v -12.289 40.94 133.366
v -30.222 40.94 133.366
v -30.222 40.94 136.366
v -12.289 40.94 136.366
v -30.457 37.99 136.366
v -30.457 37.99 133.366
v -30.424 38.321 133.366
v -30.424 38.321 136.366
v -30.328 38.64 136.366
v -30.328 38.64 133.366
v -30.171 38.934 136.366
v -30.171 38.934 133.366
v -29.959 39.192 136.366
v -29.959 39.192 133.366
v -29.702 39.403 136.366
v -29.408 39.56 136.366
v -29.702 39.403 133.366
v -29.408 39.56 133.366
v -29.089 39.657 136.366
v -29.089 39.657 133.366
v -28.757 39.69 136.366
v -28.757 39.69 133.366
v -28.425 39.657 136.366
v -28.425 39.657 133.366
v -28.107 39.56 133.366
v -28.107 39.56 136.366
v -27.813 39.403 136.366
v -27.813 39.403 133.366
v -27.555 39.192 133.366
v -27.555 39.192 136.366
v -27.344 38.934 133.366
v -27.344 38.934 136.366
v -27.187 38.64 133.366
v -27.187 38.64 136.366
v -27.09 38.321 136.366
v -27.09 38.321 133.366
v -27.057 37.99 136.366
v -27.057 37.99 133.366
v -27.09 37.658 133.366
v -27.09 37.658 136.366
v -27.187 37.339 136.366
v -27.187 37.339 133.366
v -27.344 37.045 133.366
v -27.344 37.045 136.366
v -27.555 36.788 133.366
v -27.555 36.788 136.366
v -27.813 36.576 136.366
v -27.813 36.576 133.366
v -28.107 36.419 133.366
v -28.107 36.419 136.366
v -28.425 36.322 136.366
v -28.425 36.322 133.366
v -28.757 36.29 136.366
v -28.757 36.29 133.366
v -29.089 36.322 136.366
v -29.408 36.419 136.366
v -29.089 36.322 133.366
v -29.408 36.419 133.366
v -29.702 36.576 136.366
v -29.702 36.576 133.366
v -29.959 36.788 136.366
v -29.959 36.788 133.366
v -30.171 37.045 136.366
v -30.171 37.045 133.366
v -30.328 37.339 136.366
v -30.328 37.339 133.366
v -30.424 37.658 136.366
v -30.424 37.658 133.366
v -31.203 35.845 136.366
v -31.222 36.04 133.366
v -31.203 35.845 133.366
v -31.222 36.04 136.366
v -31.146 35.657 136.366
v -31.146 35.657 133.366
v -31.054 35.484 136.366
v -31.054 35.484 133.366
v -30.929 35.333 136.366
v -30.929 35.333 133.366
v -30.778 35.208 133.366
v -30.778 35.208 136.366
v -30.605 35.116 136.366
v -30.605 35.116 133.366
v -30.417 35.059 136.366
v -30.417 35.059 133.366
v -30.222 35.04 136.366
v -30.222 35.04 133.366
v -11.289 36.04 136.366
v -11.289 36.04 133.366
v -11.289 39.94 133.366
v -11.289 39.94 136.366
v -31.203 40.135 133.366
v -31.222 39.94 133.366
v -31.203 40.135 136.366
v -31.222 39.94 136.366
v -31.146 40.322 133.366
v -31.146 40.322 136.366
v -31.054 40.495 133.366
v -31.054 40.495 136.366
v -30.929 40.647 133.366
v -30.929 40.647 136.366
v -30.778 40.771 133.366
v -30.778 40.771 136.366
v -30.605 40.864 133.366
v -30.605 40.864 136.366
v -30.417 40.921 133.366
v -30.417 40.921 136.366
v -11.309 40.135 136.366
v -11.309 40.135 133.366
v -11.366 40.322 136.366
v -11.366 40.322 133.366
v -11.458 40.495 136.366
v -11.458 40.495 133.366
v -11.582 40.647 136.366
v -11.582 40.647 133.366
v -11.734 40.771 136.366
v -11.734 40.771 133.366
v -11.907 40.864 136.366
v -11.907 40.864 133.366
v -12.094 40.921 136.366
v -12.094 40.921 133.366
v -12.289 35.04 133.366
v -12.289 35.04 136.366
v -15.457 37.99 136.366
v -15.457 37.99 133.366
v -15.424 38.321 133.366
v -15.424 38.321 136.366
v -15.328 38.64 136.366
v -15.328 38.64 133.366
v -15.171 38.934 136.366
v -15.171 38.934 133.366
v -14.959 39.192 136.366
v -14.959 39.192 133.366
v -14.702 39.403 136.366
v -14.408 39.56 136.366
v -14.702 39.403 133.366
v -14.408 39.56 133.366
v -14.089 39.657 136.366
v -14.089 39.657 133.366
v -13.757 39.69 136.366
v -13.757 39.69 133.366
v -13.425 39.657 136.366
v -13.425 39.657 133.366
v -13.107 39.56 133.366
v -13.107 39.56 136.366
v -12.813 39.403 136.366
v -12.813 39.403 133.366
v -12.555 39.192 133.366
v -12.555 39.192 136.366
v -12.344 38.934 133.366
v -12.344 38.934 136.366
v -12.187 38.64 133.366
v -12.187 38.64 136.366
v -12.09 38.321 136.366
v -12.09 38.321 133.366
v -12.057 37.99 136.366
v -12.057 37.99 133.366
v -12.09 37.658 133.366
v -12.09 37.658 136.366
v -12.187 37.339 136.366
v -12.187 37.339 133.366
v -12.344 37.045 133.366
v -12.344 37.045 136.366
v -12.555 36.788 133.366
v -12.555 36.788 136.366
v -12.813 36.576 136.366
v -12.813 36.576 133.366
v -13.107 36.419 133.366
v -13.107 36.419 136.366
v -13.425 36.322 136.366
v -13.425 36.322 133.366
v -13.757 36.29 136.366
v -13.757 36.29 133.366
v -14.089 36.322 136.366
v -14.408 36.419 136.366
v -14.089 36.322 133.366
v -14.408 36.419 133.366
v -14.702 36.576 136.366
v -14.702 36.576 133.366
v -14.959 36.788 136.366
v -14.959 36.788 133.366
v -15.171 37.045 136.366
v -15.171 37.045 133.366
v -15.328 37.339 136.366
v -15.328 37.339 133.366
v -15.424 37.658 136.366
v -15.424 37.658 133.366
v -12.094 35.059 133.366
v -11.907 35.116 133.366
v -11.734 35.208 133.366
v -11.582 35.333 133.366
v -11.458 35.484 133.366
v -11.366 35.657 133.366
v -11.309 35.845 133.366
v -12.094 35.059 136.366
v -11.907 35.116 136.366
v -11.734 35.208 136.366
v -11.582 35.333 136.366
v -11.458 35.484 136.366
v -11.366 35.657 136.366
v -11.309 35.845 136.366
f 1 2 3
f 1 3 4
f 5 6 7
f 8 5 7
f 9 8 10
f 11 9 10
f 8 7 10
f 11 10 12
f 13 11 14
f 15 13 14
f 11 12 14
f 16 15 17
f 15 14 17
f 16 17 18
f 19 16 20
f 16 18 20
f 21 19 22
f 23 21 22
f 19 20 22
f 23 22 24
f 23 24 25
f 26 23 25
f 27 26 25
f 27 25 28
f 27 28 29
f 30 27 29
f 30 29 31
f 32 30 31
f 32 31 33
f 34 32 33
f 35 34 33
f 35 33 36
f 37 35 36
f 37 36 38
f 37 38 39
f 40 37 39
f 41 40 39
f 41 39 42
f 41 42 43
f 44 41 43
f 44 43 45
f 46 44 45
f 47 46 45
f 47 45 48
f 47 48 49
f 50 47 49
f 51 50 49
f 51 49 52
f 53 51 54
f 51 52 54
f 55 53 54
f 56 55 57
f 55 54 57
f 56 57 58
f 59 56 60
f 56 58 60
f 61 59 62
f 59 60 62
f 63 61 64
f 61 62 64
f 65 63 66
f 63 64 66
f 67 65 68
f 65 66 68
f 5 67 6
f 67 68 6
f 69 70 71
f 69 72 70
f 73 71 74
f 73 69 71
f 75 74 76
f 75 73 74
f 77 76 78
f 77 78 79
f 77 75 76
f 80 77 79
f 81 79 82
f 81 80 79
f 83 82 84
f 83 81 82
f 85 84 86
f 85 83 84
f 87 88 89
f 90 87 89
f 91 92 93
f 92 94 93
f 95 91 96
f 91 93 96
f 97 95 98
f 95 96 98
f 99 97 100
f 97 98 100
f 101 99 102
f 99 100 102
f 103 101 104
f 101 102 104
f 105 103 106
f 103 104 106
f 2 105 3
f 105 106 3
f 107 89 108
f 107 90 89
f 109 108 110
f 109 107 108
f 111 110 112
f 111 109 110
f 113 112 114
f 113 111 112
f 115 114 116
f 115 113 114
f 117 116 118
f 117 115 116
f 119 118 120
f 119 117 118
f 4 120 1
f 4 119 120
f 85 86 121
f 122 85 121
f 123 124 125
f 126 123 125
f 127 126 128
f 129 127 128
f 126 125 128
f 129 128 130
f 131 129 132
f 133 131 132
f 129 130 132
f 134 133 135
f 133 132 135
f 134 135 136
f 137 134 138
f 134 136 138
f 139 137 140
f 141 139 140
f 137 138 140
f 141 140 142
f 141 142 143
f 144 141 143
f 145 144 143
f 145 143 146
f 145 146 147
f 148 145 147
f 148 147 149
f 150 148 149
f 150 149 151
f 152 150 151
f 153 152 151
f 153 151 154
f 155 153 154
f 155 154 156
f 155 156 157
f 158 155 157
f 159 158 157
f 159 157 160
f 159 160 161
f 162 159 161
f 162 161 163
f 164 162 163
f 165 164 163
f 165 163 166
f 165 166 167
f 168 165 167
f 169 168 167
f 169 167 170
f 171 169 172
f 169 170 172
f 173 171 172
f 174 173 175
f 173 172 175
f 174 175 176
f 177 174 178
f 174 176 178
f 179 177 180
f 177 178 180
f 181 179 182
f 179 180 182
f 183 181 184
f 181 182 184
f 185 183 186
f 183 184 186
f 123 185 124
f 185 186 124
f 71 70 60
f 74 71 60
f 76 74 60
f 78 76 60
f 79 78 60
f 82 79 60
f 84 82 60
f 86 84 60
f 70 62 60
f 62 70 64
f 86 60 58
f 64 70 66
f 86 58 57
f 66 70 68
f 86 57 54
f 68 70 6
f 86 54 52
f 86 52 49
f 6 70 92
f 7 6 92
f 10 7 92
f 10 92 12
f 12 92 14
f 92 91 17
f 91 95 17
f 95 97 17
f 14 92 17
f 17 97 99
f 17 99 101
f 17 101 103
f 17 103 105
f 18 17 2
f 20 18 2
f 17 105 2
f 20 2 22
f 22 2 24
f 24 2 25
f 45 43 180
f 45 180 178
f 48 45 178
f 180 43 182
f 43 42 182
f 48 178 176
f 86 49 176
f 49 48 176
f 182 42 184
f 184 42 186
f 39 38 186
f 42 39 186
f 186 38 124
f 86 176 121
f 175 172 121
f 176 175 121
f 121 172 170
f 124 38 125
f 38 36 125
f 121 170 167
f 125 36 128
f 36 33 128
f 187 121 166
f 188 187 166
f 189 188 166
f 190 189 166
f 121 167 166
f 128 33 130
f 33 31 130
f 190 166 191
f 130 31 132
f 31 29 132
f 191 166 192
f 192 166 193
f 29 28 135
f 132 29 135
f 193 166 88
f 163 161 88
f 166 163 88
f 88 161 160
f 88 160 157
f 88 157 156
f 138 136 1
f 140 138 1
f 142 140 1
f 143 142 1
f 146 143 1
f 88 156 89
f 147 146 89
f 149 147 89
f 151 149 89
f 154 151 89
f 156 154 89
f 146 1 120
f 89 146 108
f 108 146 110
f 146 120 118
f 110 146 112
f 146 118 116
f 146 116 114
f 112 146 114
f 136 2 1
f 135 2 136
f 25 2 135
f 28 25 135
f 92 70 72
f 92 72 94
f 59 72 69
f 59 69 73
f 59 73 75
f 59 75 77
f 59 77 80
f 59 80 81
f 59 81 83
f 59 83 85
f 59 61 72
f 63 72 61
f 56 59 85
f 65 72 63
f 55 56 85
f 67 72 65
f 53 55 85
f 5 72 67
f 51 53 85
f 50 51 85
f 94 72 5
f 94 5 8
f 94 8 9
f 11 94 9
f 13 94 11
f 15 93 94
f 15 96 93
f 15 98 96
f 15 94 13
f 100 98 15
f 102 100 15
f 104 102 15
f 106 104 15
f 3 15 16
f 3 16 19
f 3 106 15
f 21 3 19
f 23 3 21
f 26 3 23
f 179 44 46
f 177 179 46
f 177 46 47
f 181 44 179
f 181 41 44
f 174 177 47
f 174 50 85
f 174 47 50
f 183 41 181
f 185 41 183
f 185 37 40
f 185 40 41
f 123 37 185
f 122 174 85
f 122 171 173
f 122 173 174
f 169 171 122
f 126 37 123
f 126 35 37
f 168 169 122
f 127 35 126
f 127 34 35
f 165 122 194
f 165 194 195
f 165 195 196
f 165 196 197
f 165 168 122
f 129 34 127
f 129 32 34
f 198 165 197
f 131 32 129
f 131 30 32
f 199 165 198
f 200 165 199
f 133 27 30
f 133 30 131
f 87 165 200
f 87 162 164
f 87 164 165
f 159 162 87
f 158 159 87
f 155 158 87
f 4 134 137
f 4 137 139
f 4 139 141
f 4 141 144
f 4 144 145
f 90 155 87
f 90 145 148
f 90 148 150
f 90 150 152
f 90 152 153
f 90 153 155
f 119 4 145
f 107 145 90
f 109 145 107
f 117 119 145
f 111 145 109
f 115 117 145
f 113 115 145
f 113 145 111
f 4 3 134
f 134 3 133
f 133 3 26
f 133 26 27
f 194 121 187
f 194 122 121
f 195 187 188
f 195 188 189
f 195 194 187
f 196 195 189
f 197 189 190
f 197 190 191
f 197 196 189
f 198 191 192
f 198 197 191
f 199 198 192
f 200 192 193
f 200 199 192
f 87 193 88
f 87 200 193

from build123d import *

# Parameters (mm, degrees)
SKETCH2_W                = 19.932631385
SKETCH2_H                = 5.9
BOSS_EXTRUDE1_DEPTH      = 3
FILLET1_R                = 1
M3_CLEARANCE_HOLE1_D     = 3.4
M3_CLEARANCE_HOLE1_DEPTH = 16.5
M3_CLEARANCE_HOLE1_TIP   = 1.021463052


with BuildPart() as part:
    # Sketch2 → Boss-Extrude1 (new body)
    with BuildSketch(Plane.XY.offset(133.365661293)):
        with Locations((-21.255805031, 37.989811256)):
            Rectangle(SKETCH2_W, SKETCH2_H)
    extrude(amount=BOSS_EXTRUDE1_DEPTH)

    # Fillet1
    fillet1_edges = [part.edges().sort_by_distance(p)[0] for p in [
        (-31.222120723, 40.939811256, 134.865661293),
        (-11.289489338, 40.939811256, 134.865661293),
        (-11.289489338, 35.039811256, 134.865661293),
        (-31.222120723, 35.039811256, 134.865661293),
    ]]
    fillet(fillet1_edges, radius=FILLET1_R)

    # M3 Clearance Hole1
    with Locations(Plane.XY.offset(136.365661293)):
        with Locations((-28.757120723, 37.989811256), (-13.757120723, 37.989811256)):
            Hole(M3_CLEARANCE_HOLE1_D / 2, depth=M3_CLEARANCE_HOLE1_DEPTH)
            with Locations((0, 0, -(M3_CLEARANCE_HOLE1_DEPTH + M3_CLEARANCE_HOLE1_TIP / 2))):  # 118° drill point
                Cone(0, M3_CLEARANCE_HOLE1_D / 2, M3_CLEARANCE_HOLE1_TIP, mode=Mode.SUBTRACT)


solid = part.part
